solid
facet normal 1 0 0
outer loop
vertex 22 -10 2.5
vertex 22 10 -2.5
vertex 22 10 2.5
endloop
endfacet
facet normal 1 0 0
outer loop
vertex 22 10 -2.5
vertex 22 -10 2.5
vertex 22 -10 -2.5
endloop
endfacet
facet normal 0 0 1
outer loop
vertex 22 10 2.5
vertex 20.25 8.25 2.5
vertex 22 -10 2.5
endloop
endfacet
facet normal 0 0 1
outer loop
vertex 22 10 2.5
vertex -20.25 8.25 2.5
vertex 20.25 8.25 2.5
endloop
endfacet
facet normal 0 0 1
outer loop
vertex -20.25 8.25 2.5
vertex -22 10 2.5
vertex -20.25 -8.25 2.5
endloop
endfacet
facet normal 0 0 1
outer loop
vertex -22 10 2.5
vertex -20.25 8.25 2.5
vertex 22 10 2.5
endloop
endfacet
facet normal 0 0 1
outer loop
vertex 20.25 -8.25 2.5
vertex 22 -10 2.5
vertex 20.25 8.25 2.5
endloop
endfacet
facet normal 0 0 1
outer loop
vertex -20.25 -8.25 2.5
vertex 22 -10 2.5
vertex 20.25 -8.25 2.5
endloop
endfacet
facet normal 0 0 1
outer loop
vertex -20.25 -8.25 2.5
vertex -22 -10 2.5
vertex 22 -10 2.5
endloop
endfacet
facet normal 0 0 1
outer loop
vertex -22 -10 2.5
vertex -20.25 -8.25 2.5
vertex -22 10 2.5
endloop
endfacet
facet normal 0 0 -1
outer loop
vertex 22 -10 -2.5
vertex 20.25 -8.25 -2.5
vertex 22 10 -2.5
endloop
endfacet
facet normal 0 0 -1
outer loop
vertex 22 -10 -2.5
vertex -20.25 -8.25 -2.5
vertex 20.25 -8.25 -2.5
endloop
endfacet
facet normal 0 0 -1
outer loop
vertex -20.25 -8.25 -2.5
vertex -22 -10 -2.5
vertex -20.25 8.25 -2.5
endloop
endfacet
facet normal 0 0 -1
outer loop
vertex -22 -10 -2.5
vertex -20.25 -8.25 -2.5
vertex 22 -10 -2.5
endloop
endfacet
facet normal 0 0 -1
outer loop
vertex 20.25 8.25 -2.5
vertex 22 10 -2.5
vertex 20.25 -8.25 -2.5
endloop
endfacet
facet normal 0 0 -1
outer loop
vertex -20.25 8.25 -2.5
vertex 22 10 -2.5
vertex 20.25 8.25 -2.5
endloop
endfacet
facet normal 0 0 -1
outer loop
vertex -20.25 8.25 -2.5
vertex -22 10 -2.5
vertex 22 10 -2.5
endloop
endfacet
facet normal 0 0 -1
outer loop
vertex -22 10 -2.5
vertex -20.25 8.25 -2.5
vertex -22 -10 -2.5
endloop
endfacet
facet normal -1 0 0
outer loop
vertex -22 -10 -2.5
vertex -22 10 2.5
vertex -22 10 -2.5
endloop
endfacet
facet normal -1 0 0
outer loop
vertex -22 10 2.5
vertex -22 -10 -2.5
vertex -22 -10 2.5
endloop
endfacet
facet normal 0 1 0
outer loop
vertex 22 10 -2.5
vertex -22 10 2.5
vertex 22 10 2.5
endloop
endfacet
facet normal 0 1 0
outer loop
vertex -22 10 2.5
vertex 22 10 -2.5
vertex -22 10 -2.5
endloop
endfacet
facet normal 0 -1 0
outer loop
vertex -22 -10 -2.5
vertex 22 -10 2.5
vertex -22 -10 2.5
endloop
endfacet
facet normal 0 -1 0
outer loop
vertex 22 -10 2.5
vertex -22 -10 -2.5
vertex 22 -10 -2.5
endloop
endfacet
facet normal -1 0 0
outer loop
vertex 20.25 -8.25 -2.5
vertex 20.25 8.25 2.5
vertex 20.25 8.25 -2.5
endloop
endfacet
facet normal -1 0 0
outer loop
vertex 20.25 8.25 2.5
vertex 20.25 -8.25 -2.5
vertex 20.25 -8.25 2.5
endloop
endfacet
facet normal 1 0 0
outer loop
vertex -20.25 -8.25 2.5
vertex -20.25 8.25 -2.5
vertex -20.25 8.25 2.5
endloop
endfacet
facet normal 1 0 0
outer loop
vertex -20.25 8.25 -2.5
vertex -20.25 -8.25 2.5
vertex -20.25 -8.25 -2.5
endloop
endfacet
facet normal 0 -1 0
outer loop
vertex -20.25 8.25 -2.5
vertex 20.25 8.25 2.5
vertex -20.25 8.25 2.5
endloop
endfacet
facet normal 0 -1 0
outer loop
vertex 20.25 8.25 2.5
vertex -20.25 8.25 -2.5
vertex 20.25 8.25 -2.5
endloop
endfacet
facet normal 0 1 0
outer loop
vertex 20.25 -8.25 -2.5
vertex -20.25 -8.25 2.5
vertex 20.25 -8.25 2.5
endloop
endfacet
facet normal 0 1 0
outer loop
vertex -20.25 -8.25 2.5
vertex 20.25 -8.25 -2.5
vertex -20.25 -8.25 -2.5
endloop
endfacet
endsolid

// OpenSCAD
$fa = 1;
$fs = 0.4;

touch = 0.001;      // Small margin to avoid "touching faces"

// Base legs
base_leg_l = 80;    // Length of the base legs
base_leg_w = 15;    // Width of the base legs
base_leg_h = 3;     // Height or thickness
base_leg_r = 5;     // Rounded corner radius

// Pillar
pillar_dia = 20;    // Diameter of the pillar
pillar_h = 50;      // Height of the pillar before the dome is added

mount_space = 15;   // How much space to give for the arm to drop below 90 deg
mount_dia = 3.5;    // Diameter of the mounting hole

filet_r = 5;        // Filet radius for the bottom of the pillar

// Arm
arm_l = 30;         // Length of the arm
arm_fix_w = 4;      // 
arm_plate_w = 70;   // Width of the mounting plate
arm_plate_d = 35;   // Depth of the mounting plate
arm_plate_th = 2;   // Thickness of the mounting plate
arm_plate_r=5;      // Radius of corner rounding

screw_dia = 3;      // Diameter of the screw used to fix the arm to the stand

// Clip
clip_w = 5;
clip_th = 2;
case_w = 40;
case_th = 14;
tolerance = 0.5;

module pillar(h, dia, filet_r, mount_space, mount_dia) {

    difference() {
        union() {
            // Column
            linear_extrude(height=h) {
                circle(r=dia/2);
            }
            // Spherical top
            translate([0, 0, h]) {
                sphere(r=dia/2);
            }
            // Filet
            translate([0,0,filet_r])
            rotate_extrude(angle=360, convexity = 2) {
                translate([(dia/2 + filet_r - 0.001),0,0])
                rotate(180)
                difference() {
                    square(filet_r);    
                    circle(filet_r);
                }
            }
        }
        union () {
            // Cut outs at top of pillar
            // Halve the sphere
            translate([dia/2, 0, h - mount_space]) {
                linear_extrude(height=(dia/2 + mount_space)) {
                    square([dia, dia], center=true);
                }
            }
            // Mount Hole
            translate([touch, 0, h]) {
                rotate([0, -90, 0]) {
                    linear_extrude(h - dia) {
                        circle(r=mount_dia/2);
                    }
                }
            }
        }
    }
}

module stand (h, dia, leg_l, leg_w, leg_h, leg_r, mount_space, mount_hole_dia) {
    // Base
    linear_extrude(height=leg_h) {            
        offset(r=leg_r) {
            rotate([0, 0, 45]) {
                square([leg_l, leg_w], center=true);
            }
            rotate([0, 0, -45]) {
                square([leg_l, leg_w], center=true);
            }
        }
    }
    // Pillar
    translate([0, 0, leg_h - touch]) { 
        pillar(h, dia, leg_r, mount_space, mount_hole_dia);
    }
}

module arm (l, dia, mount_space, mount_th, screw_dia, plate_w, plate_h, plate_th, plate_r) {
    difference() {
        pillar(l, dia, filet_r, mount_space, screw_dia);    
        // set mount screw face
        translate([-mount_th - dia/2, 0, l - mount_space]) {
            linear_extrude(height=(dia/2 + mount_space)) {
                square([dia, dia], center=true);
            }
        }
    }
    // Mount Plate
    translate([0, 0, -plate_th + touch]) {
        linear_extrude(height=plate_th) {
            offset(plate_r) {
                square([plate_w - plate_r, plate_h - plate_r], center=true);
            }
        }
    }
}

module clip(clip_w, clip_th, case_w, case_th, mount_th, tolerance) {
    difference() {
        cube([case_w + 2 * clip_th, case_th + mount_th + 2 * clip_th, clip_w], center=true);
        cube([case_w + tolerance, case_th + mount_th + tolerance, clip_w + touch], center=true);
    }
}
//stand(pillar_h, pillar_dia, base_leg_l, base_leg_w, base_leg_h, base_leg_r, mount_space, mount_dia);
//arm(arm_l, pillar_dia, mount_space, arm_fix_w, screw_dia, arm_plate_w, arm_plate_d, arm_plate_th, arm_plate_r );
clip(clip_w, clip_th, case_w, case_th, arm_plate_th, tolerance);
